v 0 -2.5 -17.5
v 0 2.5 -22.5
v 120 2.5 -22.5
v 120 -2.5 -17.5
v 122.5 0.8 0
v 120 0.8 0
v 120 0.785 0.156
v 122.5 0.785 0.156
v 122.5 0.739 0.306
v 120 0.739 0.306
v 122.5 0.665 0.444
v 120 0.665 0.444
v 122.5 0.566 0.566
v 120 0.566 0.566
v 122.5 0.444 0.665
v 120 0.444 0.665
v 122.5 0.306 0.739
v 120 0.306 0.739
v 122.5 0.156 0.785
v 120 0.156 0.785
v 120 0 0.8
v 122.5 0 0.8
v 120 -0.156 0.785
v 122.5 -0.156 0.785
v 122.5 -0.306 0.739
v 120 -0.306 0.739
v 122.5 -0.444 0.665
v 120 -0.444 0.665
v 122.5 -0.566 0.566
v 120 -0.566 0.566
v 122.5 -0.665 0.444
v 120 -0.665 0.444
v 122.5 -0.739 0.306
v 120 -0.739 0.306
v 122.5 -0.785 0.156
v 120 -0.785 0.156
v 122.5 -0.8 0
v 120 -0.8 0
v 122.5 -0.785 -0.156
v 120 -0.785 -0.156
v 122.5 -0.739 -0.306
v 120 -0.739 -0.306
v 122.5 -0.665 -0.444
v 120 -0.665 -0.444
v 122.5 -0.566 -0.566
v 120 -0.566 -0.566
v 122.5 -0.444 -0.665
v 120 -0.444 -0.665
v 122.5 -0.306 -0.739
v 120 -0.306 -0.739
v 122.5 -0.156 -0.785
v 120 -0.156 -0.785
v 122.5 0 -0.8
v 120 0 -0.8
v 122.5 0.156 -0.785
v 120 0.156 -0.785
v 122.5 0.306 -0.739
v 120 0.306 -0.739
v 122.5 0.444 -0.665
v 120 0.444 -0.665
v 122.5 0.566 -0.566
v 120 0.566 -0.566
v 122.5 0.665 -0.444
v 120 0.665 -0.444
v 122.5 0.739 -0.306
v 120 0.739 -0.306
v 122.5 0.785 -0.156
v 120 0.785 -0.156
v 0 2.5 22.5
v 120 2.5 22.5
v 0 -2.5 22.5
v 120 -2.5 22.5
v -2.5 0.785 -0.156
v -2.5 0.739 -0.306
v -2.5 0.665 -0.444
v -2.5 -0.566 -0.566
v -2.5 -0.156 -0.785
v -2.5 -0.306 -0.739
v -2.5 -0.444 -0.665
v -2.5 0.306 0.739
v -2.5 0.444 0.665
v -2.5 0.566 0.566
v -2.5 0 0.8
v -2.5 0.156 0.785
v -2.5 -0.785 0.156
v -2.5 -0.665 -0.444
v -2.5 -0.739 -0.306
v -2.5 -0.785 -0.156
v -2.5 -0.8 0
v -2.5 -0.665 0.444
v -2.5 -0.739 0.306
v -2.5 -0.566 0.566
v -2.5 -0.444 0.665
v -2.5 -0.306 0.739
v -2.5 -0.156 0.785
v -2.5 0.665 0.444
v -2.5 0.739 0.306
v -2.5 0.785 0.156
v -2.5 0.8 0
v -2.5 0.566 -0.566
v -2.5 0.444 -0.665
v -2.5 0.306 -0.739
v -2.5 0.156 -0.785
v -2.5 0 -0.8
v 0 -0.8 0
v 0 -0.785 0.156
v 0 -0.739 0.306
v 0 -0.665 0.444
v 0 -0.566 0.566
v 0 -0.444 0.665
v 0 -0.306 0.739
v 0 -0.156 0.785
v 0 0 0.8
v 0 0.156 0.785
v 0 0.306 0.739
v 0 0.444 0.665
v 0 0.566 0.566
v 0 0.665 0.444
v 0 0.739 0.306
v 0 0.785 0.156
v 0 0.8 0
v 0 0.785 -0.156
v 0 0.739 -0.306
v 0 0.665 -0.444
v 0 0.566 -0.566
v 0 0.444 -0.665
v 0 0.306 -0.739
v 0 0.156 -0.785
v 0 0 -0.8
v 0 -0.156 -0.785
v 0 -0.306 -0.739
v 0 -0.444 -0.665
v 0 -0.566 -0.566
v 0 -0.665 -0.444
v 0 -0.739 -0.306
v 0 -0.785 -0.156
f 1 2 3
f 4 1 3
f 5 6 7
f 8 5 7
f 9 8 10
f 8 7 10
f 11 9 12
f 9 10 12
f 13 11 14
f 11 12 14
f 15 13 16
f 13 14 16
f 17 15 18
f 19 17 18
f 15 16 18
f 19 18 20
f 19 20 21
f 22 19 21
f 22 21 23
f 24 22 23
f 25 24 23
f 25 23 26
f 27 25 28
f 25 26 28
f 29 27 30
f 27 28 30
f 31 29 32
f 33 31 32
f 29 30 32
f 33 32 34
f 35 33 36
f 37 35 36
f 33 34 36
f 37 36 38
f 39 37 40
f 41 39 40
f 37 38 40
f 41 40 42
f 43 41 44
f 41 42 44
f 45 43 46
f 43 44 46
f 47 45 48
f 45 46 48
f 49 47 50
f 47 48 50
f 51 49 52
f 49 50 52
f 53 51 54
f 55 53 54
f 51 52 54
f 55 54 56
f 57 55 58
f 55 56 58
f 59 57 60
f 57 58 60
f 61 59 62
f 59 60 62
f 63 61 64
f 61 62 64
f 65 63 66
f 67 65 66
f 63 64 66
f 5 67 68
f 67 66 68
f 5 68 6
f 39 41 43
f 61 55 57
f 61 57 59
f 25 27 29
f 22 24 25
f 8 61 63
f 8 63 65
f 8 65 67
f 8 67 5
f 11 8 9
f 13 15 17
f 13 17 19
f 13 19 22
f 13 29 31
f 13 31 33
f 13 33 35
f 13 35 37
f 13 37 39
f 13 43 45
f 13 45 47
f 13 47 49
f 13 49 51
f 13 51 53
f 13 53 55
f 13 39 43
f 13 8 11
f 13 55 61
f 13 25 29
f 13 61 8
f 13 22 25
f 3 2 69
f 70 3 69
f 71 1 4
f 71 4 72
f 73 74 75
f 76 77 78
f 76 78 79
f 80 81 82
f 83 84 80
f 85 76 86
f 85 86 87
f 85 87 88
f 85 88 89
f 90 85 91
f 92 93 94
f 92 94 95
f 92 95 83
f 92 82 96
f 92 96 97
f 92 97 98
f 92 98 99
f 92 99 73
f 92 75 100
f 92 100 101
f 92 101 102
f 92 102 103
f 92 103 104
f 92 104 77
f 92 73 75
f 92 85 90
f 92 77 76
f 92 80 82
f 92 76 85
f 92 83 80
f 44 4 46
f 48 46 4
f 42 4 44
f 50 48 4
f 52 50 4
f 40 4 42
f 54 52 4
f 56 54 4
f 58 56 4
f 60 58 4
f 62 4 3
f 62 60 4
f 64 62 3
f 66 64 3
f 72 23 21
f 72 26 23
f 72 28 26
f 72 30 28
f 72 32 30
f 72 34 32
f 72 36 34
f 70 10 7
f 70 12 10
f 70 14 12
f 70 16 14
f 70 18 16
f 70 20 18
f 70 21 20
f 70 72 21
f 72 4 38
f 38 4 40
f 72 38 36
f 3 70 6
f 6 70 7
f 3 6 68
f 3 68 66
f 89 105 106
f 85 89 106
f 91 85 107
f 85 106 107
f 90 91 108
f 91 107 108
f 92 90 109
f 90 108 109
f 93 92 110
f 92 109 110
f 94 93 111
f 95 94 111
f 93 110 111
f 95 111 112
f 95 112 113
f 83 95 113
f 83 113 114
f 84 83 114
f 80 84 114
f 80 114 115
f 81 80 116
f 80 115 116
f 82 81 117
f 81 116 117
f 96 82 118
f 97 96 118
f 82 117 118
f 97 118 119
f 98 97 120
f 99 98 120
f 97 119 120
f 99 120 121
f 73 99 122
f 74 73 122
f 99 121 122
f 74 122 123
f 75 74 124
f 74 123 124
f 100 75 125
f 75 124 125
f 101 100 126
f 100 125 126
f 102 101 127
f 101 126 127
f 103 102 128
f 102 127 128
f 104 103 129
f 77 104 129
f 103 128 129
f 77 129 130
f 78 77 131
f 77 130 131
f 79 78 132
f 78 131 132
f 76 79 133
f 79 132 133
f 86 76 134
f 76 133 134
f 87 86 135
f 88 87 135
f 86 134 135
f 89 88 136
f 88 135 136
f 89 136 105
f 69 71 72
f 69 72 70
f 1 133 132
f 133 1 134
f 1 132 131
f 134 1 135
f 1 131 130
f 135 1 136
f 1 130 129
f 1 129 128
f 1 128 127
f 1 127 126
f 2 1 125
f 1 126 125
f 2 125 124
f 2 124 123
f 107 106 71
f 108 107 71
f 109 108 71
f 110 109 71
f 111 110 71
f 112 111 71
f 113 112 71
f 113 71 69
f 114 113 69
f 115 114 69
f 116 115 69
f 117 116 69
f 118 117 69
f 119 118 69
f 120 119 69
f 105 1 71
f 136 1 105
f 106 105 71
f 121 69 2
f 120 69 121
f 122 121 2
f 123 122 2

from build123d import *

# Parameters (mm, degrees)
F0_W     = 5
F0_H     = 45
F1_DEPTH = 120
F2_SIZE  = 4.99999
F3_R     = 0.8
F4_DEPTH = 2.5
F5_R     = 0.8
F6_DEPTH = 2.5


# Not quite as in the source:
# - a fillet or chamfer is up to 0.001 mm smaller than in the source, because OpenCascade refuses the exact size


with BuildPart() as f1:
    # F0 (on Right) → F1 (new body)
    with BuildSketch(Plane.YZ):
        Rectangle(F0_W, F0_H)
    extrude(amount=F1_DEPTH)

    # F2 (size 5 in the source; OpenCascade refuses exactly that, so slightly less here)
    f2_edges = [f1.edges().sort_by_distance(p)[0] for p in [
        (60, -2.5, -22.5),
    ]]
    chamfer(f2_edges, length=F2_SIZE)

    # F3 (on face) → F4 (join)
    with BuildSketch(Plane(origin=(0, 0, 0), x_dir=(0, -1, 0), z_dir=(-1, 0, 0))):
        Circle(F3_R)
    extrude(amount=F4_DEPTH)

    # F5 (on face) → F6 (join)
    with BuildSketch(Plane.YZ.offset(120)):
        Circle(F5_R)
    extrude(amount=F6_DEPTH)


solid = f1.part
